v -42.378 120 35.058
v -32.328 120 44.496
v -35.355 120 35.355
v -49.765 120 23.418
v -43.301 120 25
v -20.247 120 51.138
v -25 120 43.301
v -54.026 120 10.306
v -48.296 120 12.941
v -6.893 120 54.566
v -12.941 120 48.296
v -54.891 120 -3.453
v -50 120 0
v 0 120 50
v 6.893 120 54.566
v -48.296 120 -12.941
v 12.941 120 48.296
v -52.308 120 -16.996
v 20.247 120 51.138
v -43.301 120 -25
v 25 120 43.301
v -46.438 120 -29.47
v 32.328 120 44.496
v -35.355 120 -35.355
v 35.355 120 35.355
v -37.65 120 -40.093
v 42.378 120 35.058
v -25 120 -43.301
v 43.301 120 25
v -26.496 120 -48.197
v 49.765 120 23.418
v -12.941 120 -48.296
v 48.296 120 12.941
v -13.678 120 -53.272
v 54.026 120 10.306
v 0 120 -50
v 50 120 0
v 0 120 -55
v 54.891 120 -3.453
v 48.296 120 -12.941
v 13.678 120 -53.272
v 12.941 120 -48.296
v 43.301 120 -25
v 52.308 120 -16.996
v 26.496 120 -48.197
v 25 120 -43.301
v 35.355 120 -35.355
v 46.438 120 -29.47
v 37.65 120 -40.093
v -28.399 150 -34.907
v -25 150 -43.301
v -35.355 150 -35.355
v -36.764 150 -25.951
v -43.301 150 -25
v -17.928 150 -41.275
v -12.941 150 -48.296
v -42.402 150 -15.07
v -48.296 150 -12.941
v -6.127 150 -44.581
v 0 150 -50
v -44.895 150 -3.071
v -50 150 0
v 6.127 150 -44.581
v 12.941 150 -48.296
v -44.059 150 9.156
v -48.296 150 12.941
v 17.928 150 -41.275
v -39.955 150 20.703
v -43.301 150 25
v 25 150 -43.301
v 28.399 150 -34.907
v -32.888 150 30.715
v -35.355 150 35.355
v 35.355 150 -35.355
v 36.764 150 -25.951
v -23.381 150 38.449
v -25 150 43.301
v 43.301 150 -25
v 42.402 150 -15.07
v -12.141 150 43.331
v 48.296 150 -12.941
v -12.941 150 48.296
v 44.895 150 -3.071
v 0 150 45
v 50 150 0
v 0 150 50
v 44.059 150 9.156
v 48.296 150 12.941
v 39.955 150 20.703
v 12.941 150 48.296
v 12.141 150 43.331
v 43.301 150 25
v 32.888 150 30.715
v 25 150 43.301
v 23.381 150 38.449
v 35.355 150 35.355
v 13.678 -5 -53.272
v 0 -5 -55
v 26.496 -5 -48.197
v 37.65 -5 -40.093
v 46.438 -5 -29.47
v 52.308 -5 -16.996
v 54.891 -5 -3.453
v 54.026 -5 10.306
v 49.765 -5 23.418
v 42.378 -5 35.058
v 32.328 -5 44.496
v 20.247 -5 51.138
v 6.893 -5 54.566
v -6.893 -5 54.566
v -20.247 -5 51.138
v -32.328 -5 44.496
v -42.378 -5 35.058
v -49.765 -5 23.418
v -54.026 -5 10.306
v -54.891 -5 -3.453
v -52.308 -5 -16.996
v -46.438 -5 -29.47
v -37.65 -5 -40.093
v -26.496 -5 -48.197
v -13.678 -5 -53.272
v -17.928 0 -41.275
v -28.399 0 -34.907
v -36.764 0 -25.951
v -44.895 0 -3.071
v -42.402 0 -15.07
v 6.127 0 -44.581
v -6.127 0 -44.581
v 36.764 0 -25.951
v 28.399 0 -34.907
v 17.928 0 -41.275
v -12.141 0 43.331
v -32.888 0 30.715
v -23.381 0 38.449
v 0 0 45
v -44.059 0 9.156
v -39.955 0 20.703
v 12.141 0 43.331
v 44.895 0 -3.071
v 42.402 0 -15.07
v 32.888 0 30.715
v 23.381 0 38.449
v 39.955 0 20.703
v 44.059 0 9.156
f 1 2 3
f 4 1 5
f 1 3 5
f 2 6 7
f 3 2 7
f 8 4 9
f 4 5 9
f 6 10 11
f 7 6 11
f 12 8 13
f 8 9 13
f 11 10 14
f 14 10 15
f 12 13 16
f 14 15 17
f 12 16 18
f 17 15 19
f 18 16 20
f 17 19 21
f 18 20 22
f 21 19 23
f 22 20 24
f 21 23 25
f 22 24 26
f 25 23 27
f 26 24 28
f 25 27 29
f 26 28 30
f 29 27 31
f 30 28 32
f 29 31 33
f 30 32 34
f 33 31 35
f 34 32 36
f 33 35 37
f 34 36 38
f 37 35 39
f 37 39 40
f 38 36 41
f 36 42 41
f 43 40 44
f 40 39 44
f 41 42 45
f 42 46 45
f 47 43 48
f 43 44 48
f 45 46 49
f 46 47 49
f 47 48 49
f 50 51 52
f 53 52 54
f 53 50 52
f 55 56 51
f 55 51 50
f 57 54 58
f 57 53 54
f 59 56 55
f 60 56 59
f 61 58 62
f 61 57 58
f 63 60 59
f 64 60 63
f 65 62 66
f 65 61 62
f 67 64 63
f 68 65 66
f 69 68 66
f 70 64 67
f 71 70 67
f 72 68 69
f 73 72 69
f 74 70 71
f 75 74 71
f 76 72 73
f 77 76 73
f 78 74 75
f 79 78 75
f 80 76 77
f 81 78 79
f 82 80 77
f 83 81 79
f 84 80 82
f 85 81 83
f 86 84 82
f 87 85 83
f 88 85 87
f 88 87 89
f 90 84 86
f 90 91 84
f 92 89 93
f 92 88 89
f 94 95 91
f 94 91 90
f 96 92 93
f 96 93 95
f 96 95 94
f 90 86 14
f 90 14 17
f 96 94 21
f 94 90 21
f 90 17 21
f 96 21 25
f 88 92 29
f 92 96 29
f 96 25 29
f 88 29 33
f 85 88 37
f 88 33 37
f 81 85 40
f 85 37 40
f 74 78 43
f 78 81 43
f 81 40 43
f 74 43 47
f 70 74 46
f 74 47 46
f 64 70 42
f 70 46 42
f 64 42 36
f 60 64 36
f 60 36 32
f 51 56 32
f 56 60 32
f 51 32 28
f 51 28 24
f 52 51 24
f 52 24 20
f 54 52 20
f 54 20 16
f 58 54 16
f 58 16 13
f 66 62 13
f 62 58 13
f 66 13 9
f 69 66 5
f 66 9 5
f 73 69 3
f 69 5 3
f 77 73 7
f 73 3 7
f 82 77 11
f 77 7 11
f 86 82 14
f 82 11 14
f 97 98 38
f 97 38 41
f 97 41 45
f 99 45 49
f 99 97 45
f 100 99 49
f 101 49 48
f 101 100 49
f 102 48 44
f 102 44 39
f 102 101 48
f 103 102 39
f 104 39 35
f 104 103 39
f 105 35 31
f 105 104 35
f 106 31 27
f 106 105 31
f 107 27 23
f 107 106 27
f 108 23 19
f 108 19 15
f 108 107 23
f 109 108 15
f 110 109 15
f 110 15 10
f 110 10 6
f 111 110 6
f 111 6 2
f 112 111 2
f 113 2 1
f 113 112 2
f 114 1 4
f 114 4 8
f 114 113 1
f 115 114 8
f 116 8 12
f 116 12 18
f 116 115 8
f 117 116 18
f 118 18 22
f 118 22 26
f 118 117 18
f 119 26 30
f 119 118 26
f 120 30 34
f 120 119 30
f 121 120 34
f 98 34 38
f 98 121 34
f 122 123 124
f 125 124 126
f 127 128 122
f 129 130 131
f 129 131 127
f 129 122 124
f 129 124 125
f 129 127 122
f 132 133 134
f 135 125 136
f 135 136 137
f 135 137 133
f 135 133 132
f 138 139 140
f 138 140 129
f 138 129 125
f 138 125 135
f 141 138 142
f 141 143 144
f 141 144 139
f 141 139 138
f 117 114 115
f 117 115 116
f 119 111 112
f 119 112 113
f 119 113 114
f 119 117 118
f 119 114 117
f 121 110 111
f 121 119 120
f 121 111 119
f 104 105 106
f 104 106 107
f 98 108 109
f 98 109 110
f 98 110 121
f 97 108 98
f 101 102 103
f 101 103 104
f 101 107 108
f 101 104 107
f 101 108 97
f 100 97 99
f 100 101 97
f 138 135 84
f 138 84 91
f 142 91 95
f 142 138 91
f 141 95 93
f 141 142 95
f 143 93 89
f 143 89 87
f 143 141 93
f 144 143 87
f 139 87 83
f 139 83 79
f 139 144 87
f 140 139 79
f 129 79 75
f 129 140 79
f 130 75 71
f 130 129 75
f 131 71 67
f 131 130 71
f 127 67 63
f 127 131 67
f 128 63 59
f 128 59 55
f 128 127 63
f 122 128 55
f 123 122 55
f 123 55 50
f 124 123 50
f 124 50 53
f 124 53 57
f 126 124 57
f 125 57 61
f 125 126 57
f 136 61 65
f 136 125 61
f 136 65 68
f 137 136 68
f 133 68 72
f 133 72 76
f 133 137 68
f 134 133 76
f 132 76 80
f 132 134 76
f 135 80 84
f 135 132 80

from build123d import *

# Parameters (mm, degrees)
SKETCH1_R           = 45
BOSS_EXTRUDE2_DEPTH = 150
SHELL1_T            = 5
SKETCH2_R           = 55
SKETCH2_R_2         = 50
BOSS_EXTRUDE3_DEPTH = 125


with BuildPart() as part:
    # Sketch1 → Boss-Extrude2 (new body)
    with BuildSketch(Plane(origin=(0, 0, 0), x_dir=(1, 0, 0), z_dir=(0, 1, 0))):
        with Locations(Location((0, 0, 0), (0, 0, 270))):
            Circle(SKETCH1_R)
    extrude(amount=BOSS_EXTRUDE2_DEPTH)

    # Shell1
    shell1_openings = [part.faces().sort_by_distance(p)[0] for p in [
        (0, 150, 0),
    ]]
    offset(amount=SHELL1_T, openings=shell1_openings, kind=Kind.INTERSECTION)

    # Sketch2 → Boss-Extrude3 (add)
    with BuildSketch(Plane(origin=(0, -5, 0), x_dir=(-1, 0, 0), z_dir=(0, -1, 0))):
        with Locations(Location((0, 0, 0), (0, 0, 90))):
            Circle(SKETCH2_R)
        with Locations(Location((0, 0, 0), (0, 0, 90))):
            Circle(SKETCH2_R_2, mode=Mode.SUBTRACT)
    extrude(amount=-BOSS_EXTRUDE3_DEPTH)


solid = part.part
